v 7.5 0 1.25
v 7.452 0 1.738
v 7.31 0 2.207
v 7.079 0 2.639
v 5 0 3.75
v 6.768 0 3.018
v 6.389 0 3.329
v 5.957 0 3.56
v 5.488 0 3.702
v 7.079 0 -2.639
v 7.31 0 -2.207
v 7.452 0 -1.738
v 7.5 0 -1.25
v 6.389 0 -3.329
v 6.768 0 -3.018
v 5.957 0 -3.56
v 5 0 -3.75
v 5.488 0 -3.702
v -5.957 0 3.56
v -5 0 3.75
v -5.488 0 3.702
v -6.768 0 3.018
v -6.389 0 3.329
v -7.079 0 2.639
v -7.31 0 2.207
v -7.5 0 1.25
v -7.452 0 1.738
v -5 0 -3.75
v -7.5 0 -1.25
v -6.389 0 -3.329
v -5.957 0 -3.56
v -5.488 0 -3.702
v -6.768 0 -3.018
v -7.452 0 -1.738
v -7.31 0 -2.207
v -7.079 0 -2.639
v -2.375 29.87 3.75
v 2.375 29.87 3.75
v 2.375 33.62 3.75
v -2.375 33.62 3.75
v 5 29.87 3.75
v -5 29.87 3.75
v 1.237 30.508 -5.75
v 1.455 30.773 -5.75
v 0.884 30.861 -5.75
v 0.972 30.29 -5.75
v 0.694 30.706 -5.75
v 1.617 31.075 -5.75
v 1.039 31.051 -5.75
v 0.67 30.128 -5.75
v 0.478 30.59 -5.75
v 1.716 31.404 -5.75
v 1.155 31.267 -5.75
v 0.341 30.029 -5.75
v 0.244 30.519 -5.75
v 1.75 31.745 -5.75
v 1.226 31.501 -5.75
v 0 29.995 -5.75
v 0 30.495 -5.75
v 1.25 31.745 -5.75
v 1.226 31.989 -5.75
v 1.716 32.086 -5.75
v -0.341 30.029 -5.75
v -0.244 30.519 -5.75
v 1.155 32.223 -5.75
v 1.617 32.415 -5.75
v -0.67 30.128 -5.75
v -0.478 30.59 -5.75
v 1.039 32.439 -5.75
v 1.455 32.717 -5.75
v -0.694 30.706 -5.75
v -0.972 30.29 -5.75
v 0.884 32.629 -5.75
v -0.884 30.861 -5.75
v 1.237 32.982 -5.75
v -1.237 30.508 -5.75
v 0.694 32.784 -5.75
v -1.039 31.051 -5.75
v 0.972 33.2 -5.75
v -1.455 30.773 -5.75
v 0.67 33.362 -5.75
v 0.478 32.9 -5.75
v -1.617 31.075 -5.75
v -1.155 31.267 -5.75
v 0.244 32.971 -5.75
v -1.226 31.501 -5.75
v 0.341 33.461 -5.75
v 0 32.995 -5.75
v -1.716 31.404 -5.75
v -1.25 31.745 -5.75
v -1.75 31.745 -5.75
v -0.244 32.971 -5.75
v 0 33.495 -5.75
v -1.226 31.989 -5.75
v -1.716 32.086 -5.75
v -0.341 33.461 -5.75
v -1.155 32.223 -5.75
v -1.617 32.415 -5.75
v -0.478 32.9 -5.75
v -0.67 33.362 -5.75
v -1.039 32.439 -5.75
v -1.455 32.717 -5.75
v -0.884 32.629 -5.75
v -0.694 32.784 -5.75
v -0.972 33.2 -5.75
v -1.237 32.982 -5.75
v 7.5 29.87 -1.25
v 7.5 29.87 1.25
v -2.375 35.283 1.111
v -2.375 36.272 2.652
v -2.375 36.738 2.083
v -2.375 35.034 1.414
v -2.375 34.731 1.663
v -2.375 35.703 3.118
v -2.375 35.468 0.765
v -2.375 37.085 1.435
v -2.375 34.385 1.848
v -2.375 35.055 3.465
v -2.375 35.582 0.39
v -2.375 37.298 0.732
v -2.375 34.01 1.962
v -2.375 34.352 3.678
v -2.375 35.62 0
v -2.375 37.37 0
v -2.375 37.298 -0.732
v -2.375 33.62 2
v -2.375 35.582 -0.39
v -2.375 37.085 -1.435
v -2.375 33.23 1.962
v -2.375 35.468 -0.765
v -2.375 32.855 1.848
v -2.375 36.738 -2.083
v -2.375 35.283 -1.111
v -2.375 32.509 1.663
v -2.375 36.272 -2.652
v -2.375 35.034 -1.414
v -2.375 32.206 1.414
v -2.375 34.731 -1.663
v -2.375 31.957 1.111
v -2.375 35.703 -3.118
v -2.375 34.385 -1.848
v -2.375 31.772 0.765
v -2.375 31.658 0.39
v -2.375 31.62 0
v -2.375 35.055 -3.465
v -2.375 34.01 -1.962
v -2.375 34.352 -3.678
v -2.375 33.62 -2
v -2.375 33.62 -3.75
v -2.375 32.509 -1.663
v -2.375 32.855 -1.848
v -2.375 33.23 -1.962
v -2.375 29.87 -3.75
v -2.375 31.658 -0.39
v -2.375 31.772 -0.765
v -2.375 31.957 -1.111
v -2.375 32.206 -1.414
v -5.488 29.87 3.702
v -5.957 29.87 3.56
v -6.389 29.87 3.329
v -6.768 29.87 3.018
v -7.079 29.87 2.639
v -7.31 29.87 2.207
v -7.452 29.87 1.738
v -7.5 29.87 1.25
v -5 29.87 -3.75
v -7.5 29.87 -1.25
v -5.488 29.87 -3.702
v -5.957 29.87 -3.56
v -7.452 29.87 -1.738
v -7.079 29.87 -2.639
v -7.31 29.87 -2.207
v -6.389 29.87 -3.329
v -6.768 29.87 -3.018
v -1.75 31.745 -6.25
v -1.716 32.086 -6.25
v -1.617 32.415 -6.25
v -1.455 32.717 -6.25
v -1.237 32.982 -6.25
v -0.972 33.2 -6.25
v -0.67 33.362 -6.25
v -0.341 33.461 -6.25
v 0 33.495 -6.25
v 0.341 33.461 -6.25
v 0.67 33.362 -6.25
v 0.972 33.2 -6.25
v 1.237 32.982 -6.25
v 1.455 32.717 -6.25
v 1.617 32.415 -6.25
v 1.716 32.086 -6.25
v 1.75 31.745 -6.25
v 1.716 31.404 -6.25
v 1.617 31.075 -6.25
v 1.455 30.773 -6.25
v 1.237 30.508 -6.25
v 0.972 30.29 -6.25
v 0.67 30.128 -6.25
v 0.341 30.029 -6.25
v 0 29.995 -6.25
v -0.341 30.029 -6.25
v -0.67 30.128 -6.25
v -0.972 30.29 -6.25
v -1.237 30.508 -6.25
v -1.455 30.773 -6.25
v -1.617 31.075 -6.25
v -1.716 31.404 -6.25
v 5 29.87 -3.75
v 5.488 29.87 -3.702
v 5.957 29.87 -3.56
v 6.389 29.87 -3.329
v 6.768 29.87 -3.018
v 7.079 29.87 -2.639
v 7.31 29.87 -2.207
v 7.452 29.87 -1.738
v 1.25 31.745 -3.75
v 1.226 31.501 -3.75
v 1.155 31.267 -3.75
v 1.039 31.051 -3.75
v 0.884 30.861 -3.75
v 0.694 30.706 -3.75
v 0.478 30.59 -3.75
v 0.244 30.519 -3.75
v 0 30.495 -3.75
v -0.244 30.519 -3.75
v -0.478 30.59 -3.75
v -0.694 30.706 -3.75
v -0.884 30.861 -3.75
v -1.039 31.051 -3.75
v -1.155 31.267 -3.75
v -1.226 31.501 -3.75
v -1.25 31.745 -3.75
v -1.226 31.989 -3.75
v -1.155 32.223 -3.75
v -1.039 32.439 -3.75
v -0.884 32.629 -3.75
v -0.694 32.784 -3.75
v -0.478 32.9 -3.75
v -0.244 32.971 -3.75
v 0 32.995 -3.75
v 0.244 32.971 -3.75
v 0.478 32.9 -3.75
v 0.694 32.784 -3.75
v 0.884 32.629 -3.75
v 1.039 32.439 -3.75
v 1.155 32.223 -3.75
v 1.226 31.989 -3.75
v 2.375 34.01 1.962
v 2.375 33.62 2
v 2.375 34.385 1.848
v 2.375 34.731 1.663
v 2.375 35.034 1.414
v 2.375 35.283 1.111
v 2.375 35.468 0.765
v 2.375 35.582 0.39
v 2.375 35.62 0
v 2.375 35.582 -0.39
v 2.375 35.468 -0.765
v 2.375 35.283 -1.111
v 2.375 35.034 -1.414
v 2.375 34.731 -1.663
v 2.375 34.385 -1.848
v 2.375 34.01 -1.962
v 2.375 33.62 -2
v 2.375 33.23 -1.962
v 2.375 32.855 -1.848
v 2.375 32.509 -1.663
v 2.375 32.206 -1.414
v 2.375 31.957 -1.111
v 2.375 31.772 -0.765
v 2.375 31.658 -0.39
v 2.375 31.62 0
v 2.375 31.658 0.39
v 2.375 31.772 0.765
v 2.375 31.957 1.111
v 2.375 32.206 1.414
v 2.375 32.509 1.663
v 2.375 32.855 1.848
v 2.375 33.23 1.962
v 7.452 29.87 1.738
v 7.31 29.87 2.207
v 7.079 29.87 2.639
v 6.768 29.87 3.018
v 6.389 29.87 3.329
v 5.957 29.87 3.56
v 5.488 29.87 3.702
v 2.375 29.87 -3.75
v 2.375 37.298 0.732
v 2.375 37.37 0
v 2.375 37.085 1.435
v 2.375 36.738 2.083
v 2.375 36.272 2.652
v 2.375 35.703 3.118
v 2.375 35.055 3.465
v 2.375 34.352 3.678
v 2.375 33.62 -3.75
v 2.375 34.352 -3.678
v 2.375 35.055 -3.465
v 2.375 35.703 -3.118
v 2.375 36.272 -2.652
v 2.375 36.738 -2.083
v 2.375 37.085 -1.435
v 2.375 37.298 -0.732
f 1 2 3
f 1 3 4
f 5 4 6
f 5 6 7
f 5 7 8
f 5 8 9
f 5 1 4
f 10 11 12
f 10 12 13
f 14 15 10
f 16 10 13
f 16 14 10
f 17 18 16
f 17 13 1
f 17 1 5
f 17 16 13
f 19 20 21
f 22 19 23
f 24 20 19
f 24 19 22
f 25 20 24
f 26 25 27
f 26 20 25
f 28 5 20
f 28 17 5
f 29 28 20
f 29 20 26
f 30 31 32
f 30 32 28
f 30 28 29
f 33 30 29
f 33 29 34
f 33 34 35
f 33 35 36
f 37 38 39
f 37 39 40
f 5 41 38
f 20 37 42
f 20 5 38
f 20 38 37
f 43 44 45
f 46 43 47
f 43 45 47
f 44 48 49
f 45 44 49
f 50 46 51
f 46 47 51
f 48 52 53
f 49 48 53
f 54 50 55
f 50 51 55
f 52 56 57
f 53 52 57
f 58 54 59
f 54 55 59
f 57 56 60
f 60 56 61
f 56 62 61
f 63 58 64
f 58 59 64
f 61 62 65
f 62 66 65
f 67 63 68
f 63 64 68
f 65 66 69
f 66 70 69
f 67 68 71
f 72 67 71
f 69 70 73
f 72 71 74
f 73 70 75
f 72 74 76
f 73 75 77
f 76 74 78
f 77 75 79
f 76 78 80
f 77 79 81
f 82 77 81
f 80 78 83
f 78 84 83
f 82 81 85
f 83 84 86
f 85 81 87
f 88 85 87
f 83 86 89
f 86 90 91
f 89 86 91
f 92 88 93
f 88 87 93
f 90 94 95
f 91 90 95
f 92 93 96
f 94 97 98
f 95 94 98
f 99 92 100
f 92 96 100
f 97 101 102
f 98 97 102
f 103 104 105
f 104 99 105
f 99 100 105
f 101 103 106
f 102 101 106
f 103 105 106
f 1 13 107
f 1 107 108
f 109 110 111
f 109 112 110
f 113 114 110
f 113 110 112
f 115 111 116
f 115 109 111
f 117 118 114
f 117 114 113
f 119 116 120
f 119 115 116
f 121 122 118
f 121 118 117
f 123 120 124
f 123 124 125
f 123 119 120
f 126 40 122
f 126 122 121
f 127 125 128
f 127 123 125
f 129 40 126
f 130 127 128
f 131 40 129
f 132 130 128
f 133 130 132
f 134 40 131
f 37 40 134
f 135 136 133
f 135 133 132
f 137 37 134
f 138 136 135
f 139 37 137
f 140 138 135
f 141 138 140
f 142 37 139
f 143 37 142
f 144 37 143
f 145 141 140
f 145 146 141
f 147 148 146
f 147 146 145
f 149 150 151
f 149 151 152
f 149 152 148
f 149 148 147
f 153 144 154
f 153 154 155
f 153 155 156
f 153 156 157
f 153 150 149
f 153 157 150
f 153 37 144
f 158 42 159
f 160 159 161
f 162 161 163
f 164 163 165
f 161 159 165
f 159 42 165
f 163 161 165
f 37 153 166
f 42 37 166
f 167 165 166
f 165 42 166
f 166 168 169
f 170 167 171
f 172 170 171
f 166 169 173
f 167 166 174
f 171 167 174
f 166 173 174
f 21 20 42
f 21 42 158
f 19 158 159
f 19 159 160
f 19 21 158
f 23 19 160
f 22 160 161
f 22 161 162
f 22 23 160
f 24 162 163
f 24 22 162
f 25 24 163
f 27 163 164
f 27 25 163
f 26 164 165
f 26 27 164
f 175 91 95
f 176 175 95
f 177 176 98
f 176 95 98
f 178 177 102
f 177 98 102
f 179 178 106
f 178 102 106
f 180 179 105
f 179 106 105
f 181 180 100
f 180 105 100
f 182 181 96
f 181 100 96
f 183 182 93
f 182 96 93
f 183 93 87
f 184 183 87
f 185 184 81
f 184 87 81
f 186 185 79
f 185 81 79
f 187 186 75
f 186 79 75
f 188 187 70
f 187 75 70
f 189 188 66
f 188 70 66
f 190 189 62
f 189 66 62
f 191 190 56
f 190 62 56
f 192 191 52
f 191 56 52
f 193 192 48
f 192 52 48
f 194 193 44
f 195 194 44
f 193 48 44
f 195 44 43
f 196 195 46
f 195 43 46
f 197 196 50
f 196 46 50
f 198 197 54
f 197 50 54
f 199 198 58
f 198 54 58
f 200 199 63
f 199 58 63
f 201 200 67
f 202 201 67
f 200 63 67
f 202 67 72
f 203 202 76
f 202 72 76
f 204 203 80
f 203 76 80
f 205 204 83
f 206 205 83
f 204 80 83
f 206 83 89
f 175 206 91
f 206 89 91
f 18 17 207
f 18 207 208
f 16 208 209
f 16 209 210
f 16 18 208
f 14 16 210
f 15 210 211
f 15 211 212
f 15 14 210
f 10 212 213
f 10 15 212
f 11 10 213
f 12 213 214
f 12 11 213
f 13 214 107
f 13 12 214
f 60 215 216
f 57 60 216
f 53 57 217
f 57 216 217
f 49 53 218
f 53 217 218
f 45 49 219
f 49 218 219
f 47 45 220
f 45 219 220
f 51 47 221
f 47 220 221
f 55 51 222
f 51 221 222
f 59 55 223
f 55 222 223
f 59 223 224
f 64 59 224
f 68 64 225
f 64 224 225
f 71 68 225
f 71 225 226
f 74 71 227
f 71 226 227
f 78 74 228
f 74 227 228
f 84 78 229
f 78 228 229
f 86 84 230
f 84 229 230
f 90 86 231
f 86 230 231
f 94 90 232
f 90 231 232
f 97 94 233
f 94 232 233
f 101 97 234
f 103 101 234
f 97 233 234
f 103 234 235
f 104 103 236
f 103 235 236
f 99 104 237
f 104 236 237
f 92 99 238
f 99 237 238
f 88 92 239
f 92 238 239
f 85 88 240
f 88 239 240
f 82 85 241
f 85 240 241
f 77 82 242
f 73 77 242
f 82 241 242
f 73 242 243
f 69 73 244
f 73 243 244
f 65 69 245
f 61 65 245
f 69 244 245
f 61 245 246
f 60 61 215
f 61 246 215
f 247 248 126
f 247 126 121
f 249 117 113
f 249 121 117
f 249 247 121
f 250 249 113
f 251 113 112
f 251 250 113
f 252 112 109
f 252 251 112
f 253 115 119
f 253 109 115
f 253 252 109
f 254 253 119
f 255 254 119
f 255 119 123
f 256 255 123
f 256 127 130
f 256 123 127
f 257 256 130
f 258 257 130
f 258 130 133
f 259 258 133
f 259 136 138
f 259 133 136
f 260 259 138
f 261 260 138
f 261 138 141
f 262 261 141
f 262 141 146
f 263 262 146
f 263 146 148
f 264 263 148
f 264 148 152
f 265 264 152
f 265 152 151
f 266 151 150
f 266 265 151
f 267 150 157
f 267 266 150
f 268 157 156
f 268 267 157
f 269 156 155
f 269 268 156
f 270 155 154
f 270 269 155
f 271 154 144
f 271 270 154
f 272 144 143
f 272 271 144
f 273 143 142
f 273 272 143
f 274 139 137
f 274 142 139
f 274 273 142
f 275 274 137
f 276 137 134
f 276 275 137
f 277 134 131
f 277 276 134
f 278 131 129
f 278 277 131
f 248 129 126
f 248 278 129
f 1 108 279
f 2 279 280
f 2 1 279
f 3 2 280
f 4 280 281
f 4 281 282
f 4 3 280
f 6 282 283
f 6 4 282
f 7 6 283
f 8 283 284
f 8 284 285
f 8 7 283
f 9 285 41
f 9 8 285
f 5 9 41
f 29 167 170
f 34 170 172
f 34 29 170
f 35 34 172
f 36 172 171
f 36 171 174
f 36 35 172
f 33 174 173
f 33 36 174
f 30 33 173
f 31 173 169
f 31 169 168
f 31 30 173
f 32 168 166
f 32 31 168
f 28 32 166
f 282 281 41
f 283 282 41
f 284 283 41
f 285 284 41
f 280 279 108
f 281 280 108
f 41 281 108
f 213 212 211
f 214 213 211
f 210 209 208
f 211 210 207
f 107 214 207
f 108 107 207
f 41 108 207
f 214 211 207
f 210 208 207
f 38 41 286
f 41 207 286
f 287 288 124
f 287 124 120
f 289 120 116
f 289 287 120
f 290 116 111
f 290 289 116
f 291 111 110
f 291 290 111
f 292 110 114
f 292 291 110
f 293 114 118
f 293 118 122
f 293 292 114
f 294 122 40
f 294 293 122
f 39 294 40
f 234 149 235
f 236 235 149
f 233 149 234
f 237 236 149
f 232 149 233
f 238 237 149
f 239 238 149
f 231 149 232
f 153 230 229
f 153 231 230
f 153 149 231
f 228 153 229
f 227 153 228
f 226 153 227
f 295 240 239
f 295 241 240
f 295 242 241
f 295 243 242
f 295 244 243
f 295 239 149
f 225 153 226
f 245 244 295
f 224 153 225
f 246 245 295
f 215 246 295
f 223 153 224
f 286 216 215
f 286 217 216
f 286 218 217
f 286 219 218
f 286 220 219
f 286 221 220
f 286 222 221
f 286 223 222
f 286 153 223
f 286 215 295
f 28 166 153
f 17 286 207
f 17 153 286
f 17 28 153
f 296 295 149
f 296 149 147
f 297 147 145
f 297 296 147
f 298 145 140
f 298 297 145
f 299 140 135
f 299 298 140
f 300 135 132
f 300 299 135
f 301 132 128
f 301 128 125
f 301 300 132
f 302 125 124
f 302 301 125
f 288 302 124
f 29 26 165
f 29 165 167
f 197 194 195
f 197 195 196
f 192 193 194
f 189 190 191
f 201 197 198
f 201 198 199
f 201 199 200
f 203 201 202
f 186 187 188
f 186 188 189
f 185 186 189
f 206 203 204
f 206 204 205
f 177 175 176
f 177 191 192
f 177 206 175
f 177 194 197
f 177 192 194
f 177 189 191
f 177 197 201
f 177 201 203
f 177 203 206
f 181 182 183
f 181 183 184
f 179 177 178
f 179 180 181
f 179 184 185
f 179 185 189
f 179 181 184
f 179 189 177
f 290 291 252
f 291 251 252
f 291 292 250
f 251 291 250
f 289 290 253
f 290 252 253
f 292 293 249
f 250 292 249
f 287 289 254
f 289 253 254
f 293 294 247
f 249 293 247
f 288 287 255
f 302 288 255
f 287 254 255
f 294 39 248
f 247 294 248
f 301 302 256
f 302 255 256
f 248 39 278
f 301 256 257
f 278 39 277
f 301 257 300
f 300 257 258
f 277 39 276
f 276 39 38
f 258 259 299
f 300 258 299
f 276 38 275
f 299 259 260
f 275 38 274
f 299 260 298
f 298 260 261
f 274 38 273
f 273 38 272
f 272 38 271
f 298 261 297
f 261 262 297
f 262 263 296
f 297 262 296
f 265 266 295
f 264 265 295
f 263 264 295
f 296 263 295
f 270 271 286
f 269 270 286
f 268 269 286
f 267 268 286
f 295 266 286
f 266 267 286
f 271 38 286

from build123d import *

# Parameters (mm, degrees)
BOSS_EXTRUDE1_DEPTH     = 29.87
SKETCH2_W               = 4.75
SKETCH2_H               = 7.5
BOSS_EXTRUDE2_DEPTH     = 7.5
CUT_EXTRUDE1_DEPTH      = 39.834199168
CUT_EXTRUDE1_DEPTH_BACK = 39.834199168
SKETCH3_R               = 2
SKETCH4_R               = 1.25
BOSS_EXTRUDE3_DEPTH     = 2
SKETCH5_R               = 1.75
BOSS_EXTRUDE4_DEPTH     = 0.5


with BuildPart() as part:
    # Sketch1 → Boss-Extrude1 (new body)
    with BuildSketch(Plane(origin=(0, 0, 0), x_dir=(1, 0, 0), z_dir=(0, 1, 0))):
        with BuildLine():
            Line((-5, 3.75), (5, 3.75))
            ThreePointArc((5, 3.75), (6.767766953, 3.017766953), (7.5, 1.25))
            Line((7.5, 1.25), (7.5, -1.25))
            ThreePointArc((7.5, -1.25), (6.767766953, -3.017766953), (5, -3.75))
            Line((5, -3.75), (-5, -3.75))
            ThreePointArc((-5, -3.75), (-6.767766953, -3.017766953), (-7.5, -1.25))
            Line((-7.5, -1.25), (-7.5, 1.25))
            ThreePointArc((-7.5, 1.25), (-6.767766953, 3.017766953), (-5, 3.75))
        make_face()
    extrude(amount=BOSS_EXTRUDE1_DEPTH)

    # Sketch2 → Boss-Extrude2 (add)
    with BuildSketch(Plane(origin=(0, 29.87, 0), x_dir=(1, 0, 0), z_dir=(0, 1, 0))):
        Rectangle(SKETCH2_W, SKETCH2_H)
    extrude(amount=BOSS_EXTRUDE2_DEPTH)

    # Sketch3 → Cut-Extrude1 (cut, two sides: drawn at the far end of the back side and taken through both)
    with BuildSketch(Plane.ZY.offset(2.375).offset(-CUT_EXTRUDE1_DEPTH_BACK)):
        with BuildLine():
            Line((-3.75, 37.37), (-3.75, 33.62))
            ThreePointArc((-3.75, 33.62), (-2.651650429, 36.271650429), (0, 37.37))
            Line((0, 37.37), (-3.75, 37.37))
        make_face()
        with BuildLine():
            ThreePointArc((0, 37.37), (2.651650429, 36.271650429), (3.75, 33.62))
            Line((3.75, 33.62), (3.75, 37.37))
            Line((3.75, 37.37), (0, 37.37))
        make_face()
        with Locations((0, 33.62)):
            Circle(SKETCH3_R)
    extrude(amount=CUT_EXTRUDE1_DEPTH + CUT_EXTRUDE1_DEPTH_BACK, mode=Mode.SUBTRACT)

    # Sketch4 → Boss-Extrude3 (add)
    with BuildSketch(Plane(origin=(0, 0, -3.75), x_dir=(-1, 0, 0), z_dir=(0, 0, -1))):
        with Locations(Location((0, 31.745, 0), (0, 0, 180))):
            Circle(SKETCH4_R)
    extrude(amount=BOSS_EXTRUDE3_DEPTH)

    # Sketch5 → Boss-Extrude4 (add)
    with BuildSketch(Plane(origin=(0, 0, -5.75), x_dir=(-1, 0, 0), z_dir=(0, 0, -1))):
        with Locations((0, 31.745)):
            Circle(SKETCH5_R)
    extrude(amount=BOSS_EXTRUDE4_DEPTH)


solid = part.part
